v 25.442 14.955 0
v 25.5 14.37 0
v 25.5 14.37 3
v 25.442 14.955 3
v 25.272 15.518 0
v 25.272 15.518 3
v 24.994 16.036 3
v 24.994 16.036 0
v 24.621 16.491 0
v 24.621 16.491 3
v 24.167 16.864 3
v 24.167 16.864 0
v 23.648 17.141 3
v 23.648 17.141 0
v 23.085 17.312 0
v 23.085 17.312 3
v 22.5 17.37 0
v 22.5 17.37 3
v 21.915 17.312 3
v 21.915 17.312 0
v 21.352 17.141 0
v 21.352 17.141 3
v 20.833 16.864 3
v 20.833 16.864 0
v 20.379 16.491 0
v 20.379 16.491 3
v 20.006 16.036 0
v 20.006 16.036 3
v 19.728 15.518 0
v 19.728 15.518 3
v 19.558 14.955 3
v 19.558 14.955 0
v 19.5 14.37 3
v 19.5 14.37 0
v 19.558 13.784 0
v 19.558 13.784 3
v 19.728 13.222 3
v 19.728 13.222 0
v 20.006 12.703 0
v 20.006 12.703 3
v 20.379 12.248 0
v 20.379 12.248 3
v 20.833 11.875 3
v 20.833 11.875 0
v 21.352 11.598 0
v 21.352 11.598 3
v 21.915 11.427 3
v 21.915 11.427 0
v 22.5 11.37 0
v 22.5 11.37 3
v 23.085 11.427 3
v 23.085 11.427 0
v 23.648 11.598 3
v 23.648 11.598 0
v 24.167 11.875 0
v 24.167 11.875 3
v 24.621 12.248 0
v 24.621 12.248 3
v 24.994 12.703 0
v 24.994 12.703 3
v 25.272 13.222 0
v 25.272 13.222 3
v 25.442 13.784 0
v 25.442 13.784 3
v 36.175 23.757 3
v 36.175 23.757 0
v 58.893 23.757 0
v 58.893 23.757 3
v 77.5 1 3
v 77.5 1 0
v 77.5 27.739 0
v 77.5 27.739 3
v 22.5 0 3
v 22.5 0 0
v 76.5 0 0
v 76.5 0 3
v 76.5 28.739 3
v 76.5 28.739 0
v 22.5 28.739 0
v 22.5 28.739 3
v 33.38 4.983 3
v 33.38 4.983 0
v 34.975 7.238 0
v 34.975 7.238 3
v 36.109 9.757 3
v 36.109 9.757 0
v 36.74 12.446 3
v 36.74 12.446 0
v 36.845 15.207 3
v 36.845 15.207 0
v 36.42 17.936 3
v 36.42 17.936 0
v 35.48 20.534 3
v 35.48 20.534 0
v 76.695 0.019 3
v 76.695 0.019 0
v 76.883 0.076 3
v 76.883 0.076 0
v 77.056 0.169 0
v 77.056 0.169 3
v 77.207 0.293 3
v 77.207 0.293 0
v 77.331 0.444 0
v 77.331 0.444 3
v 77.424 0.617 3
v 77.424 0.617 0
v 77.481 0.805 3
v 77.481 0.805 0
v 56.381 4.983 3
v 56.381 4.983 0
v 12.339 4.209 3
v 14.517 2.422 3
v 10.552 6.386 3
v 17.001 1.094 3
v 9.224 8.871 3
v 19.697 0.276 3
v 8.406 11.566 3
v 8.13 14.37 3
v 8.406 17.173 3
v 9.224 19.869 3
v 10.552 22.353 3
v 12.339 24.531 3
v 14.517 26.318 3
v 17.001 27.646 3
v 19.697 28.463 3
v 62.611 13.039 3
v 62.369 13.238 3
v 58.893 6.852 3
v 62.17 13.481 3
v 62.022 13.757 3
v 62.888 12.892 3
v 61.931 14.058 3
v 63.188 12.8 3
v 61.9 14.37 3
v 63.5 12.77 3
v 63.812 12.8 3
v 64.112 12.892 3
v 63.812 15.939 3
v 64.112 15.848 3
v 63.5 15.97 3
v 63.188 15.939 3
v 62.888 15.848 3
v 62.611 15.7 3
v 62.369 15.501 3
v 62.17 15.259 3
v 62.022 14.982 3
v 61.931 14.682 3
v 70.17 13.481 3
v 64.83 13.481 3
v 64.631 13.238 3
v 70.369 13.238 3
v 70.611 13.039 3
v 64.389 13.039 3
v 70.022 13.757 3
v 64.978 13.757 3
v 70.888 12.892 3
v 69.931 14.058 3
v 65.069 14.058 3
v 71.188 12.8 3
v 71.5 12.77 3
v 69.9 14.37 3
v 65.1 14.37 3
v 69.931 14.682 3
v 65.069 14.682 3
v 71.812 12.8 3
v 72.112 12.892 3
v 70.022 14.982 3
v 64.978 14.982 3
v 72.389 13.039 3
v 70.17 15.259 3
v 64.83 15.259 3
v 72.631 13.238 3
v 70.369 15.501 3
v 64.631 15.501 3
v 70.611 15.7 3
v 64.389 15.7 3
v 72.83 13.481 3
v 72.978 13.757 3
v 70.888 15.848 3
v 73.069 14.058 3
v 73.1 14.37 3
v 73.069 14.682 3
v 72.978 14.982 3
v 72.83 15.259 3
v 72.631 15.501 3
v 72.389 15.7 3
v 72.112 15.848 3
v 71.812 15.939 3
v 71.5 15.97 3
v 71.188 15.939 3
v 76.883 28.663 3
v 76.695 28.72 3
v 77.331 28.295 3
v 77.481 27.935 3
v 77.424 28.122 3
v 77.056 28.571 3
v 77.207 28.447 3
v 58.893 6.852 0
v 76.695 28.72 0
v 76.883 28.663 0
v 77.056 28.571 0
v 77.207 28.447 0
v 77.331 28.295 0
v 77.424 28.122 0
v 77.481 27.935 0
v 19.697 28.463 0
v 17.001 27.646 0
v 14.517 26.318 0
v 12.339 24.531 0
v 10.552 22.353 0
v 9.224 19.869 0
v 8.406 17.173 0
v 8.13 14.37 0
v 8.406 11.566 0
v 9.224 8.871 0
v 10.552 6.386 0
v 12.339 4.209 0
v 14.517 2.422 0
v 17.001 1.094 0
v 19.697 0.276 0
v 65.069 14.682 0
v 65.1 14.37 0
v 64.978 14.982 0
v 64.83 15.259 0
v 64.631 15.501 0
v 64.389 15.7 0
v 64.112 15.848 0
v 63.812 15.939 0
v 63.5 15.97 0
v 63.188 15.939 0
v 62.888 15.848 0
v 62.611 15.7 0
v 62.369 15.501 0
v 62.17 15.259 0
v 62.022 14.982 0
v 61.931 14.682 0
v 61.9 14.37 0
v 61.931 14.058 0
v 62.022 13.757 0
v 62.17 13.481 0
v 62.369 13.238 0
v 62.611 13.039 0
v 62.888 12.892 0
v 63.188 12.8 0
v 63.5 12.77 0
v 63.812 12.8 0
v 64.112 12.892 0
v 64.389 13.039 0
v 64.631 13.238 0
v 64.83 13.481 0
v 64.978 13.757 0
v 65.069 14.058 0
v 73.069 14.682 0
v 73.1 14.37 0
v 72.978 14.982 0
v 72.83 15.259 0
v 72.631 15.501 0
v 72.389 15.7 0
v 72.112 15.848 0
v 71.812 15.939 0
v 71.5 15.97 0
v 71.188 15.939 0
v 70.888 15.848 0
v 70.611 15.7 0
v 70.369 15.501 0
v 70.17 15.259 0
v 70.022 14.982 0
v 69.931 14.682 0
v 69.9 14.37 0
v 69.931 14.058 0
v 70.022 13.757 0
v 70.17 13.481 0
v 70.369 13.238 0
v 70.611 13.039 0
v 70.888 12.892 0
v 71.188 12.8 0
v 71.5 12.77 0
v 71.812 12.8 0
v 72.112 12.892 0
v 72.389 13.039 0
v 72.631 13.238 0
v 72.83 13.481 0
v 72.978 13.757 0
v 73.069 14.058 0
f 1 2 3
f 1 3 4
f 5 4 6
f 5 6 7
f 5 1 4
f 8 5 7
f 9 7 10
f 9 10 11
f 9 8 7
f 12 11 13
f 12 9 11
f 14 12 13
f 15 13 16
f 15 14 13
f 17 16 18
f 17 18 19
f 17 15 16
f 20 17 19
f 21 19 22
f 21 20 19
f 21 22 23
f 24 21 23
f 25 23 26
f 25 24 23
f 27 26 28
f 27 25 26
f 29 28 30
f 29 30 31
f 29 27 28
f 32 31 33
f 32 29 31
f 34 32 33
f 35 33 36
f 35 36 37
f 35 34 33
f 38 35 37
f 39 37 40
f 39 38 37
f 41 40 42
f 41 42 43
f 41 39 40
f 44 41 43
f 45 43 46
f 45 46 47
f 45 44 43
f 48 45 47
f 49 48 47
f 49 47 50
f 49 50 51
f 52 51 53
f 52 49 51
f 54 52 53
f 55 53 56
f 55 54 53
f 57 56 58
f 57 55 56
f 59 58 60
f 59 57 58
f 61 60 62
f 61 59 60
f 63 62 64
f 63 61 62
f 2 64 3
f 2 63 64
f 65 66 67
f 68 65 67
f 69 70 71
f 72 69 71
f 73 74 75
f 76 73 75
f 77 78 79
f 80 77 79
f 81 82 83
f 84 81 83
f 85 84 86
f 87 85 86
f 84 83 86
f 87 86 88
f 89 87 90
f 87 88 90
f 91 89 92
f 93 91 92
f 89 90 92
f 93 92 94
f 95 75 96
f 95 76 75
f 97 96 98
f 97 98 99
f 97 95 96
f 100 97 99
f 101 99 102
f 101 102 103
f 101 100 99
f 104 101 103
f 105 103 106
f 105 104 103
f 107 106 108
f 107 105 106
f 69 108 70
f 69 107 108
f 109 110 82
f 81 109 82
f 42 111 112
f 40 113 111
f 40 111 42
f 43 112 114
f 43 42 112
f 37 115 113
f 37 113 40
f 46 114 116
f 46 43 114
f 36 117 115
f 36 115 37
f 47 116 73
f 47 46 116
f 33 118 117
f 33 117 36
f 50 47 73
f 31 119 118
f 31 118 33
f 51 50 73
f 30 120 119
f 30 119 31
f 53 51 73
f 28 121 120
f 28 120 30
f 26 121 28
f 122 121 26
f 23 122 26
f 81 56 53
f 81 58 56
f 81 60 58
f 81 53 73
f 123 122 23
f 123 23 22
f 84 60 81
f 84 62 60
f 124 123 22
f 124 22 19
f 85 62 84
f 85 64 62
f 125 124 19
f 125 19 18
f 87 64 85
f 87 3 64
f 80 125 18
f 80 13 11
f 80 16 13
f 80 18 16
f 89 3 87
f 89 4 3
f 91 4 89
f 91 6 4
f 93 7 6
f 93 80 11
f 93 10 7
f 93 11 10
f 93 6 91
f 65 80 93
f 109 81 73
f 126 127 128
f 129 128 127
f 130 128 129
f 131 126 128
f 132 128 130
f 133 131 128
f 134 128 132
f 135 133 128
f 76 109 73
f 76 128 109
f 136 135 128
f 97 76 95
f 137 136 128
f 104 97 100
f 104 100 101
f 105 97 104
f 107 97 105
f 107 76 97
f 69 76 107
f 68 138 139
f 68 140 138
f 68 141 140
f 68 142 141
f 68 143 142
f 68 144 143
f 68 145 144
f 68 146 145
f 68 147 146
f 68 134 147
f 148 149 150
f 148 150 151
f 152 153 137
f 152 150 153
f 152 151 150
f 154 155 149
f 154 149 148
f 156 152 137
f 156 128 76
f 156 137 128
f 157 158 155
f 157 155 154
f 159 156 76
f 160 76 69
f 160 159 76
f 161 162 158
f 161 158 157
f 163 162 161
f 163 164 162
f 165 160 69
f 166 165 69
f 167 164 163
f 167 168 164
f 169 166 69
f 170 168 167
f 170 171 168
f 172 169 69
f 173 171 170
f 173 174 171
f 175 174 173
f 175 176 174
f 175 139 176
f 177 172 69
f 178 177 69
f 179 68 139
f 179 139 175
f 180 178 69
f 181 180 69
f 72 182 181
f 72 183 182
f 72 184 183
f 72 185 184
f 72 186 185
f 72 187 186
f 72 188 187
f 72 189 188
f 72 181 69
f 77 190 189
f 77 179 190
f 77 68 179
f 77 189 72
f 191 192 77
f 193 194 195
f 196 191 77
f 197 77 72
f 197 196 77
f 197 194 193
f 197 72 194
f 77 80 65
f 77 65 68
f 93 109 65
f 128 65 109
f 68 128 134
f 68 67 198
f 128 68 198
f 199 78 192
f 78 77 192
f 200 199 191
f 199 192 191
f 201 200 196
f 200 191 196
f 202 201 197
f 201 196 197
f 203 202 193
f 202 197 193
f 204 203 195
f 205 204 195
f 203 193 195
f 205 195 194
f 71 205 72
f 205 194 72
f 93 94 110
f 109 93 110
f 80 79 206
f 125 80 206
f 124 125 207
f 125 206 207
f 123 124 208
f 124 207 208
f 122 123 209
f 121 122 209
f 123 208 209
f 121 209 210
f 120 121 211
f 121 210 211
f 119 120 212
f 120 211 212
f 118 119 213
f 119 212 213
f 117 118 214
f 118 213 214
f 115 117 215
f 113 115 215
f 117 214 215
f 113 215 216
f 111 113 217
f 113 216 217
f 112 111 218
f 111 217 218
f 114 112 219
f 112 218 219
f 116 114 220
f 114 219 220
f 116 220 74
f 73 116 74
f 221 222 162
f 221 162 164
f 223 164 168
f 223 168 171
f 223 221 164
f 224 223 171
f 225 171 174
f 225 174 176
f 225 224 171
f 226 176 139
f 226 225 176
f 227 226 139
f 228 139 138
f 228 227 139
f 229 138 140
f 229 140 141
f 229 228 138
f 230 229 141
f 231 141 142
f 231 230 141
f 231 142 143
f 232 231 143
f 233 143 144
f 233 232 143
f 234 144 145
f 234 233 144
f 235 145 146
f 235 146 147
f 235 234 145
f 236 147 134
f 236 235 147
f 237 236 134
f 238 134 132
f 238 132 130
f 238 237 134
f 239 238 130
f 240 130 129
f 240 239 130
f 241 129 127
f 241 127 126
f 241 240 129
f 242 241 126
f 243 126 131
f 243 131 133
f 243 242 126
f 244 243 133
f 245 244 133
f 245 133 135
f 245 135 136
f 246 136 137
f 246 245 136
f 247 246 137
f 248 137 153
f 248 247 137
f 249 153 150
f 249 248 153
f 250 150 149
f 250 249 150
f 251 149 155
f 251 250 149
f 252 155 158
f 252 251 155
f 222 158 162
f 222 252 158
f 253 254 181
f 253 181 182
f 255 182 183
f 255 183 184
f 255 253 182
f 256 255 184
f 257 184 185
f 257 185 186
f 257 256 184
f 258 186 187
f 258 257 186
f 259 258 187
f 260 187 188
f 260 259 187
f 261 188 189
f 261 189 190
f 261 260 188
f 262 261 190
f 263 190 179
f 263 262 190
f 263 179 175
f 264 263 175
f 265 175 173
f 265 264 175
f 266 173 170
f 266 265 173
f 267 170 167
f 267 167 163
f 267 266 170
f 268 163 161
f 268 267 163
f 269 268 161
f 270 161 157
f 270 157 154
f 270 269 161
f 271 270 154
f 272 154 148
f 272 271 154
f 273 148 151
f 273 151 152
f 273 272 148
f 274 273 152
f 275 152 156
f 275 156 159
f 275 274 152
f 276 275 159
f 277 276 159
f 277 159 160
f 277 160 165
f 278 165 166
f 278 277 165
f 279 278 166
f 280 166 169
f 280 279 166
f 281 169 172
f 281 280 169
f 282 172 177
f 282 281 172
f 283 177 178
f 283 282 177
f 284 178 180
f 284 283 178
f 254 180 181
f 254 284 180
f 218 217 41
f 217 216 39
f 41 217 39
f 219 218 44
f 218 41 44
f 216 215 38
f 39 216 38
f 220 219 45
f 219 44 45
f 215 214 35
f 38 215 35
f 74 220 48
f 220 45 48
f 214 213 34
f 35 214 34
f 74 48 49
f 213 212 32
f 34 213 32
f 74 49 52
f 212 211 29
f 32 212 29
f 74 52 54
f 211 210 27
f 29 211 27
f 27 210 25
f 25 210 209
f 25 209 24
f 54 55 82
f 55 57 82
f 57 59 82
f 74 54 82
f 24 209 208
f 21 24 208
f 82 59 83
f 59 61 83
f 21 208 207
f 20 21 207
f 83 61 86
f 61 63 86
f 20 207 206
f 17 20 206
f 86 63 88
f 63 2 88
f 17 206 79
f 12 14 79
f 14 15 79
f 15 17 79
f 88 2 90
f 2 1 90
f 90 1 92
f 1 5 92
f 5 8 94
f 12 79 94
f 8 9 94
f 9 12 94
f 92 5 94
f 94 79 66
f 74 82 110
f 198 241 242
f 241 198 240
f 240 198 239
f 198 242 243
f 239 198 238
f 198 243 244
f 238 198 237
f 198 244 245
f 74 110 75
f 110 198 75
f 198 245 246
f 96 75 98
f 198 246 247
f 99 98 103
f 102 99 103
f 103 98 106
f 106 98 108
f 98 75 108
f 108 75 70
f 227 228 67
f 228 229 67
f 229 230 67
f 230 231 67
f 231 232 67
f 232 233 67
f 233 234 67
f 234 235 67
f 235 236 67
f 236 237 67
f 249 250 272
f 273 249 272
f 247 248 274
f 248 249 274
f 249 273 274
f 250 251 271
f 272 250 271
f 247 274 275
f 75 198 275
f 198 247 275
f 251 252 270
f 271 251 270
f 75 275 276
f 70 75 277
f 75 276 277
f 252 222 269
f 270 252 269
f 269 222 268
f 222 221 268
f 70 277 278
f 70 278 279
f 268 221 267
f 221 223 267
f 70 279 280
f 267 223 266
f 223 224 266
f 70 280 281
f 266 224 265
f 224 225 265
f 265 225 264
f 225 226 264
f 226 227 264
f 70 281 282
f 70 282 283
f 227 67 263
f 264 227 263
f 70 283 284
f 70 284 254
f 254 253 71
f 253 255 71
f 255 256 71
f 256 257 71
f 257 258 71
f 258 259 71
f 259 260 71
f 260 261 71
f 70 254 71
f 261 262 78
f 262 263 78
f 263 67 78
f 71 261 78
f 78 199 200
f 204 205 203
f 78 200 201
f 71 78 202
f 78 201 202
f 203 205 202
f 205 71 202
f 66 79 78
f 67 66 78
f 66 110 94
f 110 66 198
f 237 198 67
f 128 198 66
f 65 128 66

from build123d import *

# Parameters (mm, degrees)
F0_R     = 3
F0_R_2   = 1.6
F1_DEPTH = 3
F2_R     = 1


with BuildPart() as f1:
    # F0 (on Top) → F1 (new body)
    with BuildSketch(Plane.XY):
        with BuildLine():
            ThreePointArc((22.499999, 28.739418), (8.13029, 14.36971), (22.499997, 0))
            Line((22.499997, 0), (77.499997, 0))
            Line((77.499997, 0), (77.499999, 28.739418))
            Line((77.499999, 28.739418), (22.499999, 28.739418))
        make_face()
        with Locations((22.499999, 14.369709)):
            Circle(F0_R, mode=Mode.SUBTRACT)
        with BuildLine():
            Line((35.480354, 20.534036), (56.380585, 4.982745))
            Line((56.380585, 4.982745), (33.379955, 4.982745))
            ThreePointArc((33.379955, 4.982745), (36.740409, 12.446362), (35.480354, 20.534036))
        make_face(mode=Mode.SUBTRACT)
        with Locations((63.499998, 14.369709)):
            Circle(F0_R_2, mode=Mode.SUBTRACT)
        with Locations((71.499998, 14.369709)):
            Circle(F0_R_2, mode=Mode.SUBTRACT)
        Polygon((36.174804, 23.756673), (58.893349, 23.756673), (58.893349, 6.852424), align=None, mode=Mode.SUBTRACT)
    extrude(amount=F1_DEPTH)

    # F2
    f2_edges = [f1.edges().sort_by_distance(p)[0] for p in [
        (77.499997, 0, 1.5),
        (77.499999, 28.739418, 1.5),
    ]]
    fillet(f2_edges, radius=F2_R)


solid = f1.part
